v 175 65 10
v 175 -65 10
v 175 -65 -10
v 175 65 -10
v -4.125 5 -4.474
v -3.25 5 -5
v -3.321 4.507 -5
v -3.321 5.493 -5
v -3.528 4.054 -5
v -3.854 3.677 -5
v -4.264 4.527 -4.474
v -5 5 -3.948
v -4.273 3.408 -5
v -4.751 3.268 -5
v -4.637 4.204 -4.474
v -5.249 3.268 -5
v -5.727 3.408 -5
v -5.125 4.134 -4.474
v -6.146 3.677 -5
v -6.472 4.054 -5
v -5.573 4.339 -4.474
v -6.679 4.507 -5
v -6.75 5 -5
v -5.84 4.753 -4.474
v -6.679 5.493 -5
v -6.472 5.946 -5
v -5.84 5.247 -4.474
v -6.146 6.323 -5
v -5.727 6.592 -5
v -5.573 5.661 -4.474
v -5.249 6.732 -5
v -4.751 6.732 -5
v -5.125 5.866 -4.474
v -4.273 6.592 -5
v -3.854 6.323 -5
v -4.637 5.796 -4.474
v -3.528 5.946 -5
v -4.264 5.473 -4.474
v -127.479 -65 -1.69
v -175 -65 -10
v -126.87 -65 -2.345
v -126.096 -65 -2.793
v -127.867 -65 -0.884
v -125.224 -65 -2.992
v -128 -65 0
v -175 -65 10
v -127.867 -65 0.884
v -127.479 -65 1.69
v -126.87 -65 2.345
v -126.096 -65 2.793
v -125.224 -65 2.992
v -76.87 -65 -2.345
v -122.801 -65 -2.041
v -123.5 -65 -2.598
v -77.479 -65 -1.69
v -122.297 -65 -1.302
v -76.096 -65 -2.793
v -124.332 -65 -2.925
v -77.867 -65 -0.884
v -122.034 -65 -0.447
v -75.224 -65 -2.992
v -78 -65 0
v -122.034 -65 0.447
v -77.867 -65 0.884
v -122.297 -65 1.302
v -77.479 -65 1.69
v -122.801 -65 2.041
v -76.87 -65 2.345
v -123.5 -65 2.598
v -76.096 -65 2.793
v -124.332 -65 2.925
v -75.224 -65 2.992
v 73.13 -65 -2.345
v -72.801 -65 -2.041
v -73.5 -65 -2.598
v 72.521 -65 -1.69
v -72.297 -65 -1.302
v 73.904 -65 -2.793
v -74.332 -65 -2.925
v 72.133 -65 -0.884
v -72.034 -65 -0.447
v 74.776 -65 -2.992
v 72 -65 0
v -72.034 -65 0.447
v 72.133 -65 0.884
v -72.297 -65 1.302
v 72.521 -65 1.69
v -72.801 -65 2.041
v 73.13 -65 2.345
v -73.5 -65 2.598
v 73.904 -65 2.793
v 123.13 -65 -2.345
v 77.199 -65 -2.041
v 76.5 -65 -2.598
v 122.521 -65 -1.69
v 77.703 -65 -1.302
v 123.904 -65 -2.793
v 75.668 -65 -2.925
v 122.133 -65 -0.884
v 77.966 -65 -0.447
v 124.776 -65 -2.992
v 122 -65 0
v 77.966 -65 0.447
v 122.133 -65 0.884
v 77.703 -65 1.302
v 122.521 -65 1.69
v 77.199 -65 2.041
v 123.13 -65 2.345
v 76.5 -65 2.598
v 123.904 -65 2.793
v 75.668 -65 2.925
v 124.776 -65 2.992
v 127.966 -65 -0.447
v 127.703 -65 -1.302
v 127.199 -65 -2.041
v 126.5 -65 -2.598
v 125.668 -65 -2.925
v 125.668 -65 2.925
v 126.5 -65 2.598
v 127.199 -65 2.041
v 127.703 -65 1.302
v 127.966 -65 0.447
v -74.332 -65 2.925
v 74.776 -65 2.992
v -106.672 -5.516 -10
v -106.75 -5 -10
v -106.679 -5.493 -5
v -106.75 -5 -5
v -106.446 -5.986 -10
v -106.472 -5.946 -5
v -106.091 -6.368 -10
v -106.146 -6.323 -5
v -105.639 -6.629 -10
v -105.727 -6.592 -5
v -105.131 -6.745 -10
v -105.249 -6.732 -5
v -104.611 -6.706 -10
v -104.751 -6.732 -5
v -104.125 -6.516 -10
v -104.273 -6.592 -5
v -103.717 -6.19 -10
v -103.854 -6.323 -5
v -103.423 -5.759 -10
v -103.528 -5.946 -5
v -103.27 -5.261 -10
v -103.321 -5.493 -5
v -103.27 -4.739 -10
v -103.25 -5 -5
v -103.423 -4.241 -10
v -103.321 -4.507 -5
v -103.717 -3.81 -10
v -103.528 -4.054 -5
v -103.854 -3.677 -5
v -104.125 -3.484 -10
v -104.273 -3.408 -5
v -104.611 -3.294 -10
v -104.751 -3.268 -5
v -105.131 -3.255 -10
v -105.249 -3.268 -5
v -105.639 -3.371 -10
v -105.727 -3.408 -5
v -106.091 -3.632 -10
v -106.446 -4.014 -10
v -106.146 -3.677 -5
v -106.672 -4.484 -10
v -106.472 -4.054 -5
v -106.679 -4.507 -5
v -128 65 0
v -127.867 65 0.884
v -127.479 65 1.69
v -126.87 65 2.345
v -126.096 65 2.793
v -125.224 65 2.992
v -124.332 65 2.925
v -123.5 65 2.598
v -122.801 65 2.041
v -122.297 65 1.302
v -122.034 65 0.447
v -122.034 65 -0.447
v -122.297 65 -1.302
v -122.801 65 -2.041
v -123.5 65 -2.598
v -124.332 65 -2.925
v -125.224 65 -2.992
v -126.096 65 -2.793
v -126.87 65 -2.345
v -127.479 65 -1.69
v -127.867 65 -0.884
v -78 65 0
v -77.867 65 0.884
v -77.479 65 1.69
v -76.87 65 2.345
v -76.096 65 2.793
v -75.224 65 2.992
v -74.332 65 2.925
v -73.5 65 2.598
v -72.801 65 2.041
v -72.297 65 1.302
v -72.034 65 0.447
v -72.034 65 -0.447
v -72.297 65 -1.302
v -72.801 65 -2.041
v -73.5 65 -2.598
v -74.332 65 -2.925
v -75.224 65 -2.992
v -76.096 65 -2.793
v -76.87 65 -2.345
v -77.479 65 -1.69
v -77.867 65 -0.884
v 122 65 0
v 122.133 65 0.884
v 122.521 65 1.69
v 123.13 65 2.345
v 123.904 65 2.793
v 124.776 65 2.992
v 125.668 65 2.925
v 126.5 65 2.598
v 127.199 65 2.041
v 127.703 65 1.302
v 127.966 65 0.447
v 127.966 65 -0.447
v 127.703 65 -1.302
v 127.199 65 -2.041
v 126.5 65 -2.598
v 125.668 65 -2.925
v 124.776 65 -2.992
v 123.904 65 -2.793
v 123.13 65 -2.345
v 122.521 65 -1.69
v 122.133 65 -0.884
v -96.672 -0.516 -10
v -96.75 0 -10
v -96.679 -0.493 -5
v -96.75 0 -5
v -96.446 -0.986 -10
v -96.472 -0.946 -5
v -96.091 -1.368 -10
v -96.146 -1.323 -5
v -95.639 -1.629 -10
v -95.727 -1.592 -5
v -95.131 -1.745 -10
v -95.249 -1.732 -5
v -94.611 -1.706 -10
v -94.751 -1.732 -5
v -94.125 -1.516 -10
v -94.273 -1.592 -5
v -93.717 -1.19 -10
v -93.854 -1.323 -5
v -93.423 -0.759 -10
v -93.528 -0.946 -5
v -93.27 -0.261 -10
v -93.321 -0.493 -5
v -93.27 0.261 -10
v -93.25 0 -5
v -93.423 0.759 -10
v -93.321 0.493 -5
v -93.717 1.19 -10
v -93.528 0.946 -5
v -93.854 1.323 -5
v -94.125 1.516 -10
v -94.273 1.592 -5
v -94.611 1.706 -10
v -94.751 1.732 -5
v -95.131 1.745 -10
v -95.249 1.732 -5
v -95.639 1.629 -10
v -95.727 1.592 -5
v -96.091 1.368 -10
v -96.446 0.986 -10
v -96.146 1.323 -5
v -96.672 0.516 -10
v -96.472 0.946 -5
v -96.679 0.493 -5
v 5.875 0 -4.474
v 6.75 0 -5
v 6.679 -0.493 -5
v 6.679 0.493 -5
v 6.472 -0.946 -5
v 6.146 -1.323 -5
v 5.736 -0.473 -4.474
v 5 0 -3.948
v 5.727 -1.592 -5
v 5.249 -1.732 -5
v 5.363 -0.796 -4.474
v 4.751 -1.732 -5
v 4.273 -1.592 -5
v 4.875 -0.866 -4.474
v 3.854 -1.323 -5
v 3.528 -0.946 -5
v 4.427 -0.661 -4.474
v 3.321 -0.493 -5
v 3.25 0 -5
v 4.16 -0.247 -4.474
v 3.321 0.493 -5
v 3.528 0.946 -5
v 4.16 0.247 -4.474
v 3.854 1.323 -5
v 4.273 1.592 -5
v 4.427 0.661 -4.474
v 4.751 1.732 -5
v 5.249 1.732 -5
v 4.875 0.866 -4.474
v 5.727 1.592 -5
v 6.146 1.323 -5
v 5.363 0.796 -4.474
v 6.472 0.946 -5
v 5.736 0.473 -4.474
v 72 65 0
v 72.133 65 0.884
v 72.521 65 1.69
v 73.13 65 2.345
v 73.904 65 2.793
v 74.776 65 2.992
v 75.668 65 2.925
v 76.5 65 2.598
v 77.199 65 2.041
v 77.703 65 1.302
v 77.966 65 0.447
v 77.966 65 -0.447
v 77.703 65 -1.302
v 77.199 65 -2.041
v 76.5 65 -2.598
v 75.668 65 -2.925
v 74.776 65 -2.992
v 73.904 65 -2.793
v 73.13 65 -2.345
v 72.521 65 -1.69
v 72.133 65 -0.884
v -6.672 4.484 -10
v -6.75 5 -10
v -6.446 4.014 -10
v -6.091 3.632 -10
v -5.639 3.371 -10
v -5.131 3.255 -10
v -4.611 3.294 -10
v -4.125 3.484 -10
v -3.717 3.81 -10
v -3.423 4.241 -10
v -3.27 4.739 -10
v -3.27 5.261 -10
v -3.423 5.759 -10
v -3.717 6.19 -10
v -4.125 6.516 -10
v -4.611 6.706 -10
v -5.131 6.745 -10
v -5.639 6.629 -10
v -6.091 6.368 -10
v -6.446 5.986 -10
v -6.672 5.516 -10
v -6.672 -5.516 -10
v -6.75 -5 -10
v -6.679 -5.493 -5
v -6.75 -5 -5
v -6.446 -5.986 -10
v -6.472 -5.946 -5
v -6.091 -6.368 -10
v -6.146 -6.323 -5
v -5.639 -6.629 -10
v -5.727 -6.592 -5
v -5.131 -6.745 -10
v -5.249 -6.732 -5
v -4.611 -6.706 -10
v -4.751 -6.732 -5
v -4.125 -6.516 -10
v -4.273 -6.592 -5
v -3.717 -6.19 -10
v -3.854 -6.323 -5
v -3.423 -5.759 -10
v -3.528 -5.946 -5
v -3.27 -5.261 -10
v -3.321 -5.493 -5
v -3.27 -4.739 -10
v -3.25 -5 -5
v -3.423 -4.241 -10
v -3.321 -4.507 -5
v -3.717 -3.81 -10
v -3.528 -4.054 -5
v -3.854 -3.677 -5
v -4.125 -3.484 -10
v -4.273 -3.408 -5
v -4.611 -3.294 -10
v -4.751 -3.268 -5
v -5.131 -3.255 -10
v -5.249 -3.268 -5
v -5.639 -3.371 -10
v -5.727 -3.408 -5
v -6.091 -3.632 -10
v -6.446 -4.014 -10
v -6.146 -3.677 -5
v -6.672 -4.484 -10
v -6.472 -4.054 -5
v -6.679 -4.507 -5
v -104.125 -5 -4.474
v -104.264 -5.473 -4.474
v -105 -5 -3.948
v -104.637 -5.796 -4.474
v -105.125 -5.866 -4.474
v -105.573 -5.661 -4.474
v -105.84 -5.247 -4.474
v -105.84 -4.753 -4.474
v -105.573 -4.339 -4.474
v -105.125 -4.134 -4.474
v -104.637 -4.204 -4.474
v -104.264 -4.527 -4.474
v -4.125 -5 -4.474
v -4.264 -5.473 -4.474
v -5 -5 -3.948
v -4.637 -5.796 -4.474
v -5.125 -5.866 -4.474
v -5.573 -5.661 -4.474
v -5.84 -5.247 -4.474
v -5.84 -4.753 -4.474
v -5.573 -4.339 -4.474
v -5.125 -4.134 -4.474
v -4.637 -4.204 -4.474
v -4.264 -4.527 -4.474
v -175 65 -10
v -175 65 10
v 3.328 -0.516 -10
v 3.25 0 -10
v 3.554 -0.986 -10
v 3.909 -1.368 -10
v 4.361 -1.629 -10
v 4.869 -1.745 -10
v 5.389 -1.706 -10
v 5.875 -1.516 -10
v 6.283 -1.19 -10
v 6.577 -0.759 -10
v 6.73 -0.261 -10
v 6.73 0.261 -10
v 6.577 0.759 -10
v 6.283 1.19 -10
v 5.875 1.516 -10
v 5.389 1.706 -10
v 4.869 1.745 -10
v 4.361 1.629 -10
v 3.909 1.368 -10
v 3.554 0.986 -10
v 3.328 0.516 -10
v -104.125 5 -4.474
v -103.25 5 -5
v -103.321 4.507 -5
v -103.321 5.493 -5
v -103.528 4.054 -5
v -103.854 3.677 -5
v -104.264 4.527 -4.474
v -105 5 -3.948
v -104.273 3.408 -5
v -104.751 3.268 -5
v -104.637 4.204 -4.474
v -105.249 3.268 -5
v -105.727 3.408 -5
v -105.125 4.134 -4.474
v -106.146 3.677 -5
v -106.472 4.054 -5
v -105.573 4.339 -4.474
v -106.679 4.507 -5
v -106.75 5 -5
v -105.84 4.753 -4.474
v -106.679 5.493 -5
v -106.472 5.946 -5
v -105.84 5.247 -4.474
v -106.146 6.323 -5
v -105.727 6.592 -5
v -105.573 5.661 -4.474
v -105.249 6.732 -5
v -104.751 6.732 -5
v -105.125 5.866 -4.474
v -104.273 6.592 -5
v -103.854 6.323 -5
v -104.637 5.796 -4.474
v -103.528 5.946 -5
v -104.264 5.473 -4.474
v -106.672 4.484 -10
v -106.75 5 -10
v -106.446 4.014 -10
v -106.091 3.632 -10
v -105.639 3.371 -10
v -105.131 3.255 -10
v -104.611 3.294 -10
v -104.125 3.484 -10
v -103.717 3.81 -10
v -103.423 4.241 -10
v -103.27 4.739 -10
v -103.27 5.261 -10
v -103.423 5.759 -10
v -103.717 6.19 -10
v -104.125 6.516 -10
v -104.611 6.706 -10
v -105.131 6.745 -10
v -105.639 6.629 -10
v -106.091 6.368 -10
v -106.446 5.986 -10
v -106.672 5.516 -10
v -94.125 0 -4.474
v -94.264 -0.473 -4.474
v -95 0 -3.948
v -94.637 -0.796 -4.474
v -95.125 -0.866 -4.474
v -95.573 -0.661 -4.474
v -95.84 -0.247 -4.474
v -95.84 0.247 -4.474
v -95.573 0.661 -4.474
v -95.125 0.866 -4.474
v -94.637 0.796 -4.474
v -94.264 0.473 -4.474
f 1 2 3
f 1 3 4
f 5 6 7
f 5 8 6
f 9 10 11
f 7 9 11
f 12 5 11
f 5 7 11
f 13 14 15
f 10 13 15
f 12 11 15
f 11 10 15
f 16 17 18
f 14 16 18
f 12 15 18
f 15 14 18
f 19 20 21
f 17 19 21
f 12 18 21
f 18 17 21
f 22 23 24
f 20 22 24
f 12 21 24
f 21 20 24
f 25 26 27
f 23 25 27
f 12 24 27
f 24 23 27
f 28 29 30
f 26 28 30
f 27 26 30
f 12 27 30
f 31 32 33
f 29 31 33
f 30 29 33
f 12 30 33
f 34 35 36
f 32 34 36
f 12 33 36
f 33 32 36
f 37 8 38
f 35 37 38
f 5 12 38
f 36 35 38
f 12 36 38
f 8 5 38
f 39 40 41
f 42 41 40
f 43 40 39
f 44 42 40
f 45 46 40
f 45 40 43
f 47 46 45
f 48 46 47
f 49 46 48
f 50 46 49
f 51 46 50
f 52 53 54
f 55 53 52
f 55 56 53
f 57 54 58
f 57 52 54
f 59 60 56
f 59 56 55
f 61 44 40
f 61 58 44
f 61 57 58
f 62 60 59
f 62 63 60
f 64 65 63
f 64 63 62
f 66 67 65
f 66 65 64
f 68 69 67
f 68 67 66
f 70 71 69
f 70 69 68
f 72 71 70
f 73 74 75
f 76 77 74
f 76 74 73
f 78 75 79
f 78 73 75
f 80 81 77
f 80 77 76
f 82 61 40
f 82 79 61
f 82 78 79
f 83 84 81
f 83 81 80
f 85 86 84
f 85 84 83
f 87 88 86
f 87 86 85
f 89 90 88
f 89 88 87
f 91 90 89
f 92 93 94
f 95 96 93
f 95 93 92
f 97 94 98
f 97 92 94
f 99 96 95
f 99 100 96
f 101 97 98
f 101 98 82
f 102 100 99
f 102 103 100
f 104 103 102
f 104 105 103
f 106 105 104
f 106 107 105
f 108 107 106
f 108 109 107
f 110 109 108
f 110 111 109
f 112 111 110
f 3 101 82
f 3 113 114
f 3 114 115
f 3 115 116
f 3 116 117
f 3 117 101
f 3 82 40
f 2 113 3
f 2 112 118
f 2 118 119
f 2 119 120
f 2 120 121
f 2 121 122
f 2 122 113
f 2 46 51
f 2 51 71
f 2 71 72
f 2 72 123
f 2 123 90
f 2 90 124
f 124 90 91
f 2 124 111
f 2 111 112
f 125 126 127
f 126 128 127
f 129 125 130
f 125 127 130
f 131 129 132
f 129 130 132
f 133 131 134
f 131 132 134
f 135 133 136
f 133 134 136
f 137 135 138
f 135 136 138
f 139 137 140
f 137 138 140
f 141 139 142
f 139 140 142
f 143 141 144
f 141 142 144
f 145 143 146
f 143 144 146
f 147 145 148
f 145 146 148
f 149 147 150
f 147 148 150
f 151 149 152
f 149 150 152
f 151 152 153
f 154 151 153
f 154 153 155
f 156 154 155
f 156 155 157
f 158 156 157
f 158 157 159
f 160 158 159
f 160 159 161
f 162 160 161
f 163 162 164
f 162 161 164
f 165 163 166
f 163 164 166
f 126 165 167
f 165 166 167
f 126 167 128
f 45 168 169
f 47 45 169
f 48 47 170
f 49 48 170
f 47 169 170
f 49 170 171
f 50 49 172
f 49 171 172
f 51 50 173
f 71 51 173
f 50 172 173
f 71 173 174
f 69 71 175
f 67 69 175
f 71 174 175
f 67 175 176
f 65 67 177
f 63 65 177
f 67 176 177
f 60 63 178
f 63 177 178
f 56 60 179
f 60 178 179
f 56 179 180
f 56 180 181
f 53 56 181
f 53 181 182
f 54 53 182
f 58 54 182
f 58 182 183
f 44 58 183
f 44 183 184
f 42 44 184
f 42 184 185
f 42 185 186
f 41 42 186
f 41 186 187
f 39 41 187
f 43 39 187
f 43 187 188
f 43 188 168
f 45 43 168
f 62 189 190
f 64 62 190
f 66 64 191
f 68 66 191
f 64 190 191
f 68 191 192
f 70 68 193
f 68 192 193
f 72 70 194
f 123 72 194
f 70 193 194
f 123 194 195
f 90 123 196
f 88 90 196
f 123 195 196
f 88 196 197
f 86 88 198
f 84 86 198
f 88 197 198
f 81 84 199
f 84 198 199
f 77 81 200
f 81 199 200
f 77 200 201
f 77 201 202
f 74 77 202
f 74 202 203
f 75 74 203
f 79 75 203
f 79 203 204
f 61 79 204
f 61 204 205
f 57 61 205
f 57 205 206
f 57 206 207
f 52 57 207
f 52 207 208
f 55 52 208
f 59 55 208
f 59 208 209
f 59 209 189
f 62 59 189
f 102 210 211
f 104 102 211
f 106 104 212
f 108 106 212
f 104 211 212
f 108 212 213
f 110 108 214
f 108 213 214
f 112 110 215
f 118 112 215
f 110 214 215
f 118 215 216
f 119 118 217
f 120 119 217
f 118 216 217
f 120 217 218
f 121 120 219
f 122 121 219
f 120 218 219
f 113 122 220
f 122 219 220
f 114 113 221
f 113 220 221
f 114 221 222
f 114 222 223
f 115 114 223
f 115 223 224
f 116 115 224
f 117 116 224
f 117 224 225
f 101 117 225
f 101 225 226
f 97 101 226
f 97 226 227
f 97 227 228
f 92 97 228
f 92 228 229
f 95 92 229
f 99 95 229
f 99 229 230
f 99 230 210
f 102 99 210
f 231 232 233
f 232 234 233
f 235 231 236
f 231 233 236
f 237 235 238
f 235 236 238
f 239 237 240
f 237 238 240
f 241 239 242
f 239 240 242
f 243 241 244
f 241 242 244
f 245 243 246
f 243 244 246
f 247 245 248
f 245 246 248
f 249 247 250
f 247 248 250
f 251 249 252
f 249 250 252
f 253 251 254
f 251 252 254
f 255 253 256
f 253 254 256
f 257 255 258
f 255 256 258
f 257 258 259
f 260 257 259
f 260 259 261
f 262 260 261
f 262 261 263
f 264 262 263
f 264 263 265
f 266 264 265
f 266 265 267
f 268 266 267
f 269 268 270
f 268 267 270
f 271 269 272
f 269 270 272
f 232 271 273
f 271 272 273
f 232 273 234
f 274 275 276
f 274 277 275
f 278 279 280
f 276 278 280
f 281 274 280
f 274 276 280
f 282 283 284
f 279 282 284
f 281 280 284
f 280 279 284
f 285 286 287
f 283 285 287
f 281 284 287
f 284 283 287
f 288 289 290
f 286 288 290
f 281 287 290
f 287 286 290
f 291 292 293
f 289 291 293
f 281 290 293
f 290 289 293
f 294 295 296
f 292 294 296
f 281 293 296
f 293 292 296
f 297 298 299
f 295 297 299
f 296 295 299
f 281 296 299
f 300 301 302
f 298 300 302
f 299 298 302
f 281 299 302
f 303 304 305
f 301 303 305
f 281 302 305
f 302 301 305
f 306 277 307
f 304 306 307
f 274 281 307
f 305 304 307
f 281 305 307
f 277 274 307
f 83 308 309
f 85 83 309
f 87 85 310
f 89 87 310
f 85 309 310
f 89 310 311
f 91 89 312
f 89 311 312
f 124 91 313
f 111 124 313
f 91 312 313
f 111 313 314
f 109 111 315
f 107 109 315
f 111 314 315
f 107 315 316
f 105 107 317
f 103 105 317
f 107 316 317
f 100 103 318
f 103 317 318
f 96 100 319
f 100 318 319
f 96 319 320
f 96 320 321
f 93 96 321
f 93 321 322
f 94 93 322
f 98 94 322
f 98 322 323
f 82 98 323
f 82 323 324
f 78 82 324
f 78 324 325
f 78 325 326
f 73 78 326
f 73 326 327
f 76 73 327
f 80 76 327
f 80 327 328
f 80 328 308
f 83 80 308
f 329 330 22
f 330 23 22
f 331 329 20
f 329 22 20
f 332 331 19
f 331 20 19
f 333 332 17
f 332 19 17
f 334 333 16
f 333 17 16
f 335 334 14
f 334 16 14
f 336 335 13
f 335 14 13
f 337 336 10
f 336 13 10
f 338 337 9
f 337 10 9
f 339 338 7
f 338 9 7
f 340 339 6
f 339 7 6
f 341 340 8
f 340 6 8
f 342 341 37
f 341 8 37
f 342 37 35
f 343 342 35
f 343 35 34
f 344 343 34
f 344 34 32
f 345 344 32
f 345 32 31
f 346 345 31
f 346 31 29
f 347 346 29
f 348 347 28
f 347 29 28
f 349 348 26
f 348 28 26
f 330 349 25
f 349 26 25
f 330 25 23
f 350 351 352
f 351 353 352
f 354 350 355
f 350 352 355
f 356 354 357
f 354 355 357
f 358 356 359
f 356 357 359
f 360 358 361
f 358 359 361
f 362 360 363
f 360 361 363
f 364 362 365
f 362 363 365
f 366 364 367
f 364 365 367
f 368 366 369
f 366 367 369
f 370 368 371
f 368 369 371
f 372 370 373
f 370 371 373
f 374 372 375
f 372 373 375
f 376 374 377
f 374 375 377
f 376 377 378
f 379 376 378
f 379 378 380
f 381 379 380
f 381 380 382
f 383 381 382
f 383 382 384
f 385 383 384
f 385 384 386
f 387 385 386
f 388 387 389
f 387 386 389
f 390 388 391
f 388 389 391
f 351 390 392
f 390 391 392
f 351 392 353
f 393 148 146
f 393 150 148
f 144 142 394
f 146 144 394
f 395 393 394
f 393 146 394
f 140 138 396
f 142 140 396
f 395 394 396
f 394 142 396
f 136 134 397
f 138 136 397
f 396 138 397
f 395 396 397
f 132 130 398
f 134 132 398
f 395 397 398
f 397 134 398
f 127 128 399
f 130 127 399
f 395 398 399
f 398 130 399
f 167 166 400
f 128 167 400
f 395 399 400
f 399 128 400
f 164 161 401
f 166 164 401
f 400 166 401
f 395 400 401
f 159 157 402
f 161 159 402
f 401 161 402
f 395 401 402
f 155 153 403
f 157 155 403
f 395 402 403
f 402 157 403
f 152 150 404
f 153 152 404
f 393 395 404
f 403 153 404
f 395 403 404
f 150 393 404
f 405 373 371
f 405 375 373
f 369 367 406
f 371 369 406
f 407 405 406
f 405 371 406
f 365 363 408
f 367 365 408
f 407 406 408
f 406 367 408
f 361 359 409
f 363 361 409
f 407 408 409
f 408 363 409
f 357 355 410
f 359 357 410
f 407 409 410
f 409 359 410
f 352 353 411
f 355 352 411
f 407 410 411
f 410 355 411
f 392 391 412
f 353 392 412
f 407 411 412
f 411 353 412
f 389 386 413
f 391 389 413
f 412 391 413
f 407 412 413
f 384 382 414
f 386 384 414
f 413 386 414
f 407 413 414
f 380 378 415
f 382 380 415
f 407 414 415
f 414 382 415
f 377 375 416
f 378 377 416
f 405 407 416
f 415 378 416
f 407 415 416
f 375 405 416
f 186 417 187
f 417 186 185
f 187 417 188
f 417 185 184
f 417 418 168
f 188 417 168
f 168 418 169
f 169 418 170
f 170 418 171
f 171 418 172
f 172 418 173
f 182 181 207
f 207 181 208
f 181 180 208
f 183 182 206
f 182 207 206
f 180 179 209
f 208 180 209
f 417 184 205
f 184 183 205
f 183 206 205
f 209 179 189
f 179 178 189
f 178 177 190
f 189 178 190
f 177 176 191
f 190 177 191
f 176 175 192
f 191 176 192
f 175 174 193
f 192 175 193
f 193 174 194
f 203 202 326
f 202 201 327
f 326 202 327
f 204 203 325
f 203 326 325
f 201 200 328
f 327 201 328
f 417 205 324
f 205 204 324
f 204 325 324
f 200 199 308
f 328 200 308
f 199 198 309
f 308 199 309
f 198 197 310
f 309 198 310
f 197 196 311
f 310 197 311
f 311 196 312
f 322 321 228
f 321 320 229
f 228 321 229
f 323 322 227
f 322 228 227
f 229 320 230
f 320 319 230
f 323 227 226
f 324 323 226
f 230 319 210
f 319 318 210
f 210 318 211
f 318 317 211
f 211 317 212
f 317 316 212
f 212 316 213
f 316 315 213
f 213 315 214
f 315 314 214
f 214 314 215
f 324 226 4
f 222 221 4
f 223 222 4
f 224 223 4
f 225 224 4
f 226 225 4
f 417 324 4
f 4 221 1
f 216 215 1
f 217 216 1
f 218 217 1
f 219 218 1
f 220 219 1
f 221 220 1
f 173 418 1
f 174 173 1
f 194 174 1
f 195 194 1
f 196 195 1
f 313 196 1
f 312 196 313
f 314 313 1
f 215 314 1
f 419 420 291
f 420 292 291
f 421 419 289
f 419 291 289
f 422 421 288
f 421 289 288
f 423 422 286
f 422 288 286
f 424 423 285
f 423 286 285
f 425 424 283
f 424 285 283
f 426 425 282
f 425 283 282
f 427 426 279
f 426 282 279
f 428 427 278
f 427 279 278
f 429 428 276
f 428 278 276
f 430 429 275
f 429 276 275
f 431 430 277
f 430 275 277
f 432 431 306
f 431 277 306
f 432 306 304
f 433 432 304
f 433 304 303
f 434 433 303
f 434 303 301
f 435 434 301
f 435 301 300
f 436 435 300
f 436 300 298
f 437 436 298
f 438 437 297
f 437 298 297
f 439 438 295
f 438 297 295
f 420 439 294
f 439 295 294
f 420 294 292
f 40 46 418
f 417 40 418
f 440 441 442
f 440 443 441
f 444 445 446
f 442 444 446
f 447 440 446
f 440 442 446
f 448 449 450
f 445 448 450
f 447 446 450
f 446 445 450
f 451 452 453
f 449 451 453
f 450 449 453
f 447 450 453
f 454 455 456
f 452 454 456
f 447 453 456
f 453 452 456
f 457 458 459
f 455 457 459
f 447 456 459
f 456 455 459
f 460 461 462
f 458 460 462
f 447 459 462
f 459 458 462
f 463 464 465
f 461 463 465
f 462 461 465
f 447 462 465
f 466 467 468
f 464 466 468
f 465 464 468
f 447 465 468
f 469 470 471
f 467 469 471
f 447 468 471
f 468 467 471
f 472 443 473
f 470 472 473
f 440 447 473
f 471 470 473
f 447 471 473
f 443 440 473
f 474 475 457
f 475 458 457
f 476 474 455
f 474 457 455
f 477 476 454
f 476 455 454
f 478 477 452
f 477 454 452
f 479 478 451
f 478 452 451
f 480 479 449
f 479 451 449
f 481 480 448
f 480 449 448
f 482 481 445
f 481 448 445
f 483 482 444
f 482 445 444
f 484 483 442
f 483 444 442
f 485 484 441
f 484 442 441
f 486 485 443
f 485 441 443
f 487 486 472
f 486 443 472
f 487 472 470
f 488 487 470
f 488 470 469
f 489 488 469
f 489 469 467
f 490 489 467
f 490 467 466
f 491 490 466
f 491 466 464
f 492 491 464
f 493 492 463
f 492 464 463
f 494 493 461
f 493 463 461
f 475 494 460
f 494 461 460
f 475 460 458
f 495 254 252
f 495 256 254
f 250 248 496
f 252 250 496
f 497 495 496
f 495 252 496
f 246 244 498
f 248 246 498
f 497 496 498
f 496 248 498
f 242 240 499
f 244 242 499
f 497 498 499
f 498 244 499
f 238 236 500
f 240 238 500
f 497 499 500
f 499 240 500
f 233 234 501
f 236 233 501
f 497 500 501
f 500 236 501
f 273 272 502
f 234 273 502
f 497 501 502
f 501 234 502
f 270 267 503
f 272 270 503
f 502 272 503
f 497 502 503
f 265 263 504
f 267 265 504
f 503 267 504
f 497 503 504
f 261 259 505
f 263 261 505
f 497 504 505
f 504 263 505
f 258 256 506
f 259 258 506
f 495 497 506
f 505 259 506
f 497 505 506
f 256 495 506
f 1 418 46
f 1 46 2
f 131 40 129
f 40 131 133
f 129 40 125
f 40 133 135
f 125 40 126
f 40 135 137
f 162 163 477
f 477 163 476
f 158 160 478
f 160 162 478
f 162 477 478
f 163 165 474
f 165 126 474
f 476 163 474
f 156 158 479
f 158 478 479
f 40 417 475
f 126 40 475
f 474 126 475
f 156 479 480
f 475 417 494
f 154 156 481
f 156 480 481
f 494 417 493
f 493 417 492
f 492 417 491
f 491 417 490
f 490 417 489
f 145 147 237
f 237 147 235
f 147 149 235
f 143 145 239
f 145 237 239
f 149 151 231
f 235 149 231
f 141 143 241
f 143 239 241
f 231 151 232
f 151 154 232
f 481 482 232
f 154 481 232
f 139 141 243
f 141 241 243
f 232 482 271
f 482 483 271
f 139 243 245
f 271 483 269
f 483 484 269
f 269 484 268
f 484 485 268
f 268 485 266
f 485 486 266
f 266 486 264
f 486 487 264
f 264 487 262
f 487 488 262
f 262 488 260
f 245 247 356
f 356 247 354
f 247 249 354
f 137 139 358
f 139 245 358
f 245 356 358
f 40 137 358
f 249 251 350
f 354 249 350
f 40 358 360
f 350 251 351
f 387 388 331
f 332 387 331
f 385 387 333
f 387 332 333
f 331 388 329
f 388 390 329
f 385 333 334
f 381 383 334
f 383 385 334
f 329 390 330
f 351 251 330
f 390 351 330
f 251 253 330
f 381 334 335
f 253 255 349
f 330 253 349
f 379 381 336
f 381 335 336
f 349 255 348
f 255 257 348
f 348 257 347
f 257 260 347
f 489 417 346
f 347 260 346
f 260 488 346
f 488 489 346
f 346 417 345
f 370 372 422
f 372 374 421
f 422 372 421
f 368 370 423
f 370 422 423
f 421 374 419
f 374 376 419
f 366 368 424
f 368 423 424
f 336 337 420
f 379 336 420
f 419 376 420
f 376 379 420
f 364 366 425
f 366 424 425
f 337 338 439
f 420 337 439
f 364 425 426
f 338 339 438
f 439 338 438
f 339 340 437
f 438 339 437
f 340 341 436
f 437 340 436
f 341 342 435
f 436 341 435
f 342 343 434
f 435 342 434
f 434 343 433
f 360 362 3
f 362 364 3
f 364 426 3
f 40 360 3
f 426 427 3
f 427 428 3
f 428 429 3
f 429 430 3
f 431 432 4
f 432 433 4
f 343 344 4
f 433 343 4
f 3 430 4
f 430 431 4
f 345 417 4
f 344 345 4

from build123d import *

# Parameters (mm, degrees)
F0_W     = 350
F0_H     = 130
F1_DEPTH = 10
F3_D     = 6
F5_D     = 3.5
F5_DEPTH = 5
F5_TIP   = 1.0515060833


with BuildPart() as f1:
    # F0 (on Top) → F1 (new body, symmetric)
    with BuildSketch(Plane.XY):
        Rectangle(F0_W, F0_H)
    extrude(amount=F1_DEPTH, both=True)

    # F3 (through all)
    with Locations(Plane.XZ.offset(65)):
        with Locations((-125, 0), (-75, 0), (75, 0), (125, 0)):
            Hole(F3_D / 2)

    # F5
    with Locations(Plane(origin=(0, 0, -10), x_dir=(1, 0, 0), z_dir=(0, 0, -1))):
        with Locations((-105, 5), (-105, -5), (-95, 0), (-5, 5), (-5, -5), (5, 0)):
            Hole(F5_D / 2, depth=F5_DEPTH)
            with Locations((0, 0, -(F5_DEPTH + F5_TIP / 2))):  # 118° drill point
                Cone(0, F5_D / 2, F5_TIP, mode=Mode.SUBTRACT)


solid = f1.part
